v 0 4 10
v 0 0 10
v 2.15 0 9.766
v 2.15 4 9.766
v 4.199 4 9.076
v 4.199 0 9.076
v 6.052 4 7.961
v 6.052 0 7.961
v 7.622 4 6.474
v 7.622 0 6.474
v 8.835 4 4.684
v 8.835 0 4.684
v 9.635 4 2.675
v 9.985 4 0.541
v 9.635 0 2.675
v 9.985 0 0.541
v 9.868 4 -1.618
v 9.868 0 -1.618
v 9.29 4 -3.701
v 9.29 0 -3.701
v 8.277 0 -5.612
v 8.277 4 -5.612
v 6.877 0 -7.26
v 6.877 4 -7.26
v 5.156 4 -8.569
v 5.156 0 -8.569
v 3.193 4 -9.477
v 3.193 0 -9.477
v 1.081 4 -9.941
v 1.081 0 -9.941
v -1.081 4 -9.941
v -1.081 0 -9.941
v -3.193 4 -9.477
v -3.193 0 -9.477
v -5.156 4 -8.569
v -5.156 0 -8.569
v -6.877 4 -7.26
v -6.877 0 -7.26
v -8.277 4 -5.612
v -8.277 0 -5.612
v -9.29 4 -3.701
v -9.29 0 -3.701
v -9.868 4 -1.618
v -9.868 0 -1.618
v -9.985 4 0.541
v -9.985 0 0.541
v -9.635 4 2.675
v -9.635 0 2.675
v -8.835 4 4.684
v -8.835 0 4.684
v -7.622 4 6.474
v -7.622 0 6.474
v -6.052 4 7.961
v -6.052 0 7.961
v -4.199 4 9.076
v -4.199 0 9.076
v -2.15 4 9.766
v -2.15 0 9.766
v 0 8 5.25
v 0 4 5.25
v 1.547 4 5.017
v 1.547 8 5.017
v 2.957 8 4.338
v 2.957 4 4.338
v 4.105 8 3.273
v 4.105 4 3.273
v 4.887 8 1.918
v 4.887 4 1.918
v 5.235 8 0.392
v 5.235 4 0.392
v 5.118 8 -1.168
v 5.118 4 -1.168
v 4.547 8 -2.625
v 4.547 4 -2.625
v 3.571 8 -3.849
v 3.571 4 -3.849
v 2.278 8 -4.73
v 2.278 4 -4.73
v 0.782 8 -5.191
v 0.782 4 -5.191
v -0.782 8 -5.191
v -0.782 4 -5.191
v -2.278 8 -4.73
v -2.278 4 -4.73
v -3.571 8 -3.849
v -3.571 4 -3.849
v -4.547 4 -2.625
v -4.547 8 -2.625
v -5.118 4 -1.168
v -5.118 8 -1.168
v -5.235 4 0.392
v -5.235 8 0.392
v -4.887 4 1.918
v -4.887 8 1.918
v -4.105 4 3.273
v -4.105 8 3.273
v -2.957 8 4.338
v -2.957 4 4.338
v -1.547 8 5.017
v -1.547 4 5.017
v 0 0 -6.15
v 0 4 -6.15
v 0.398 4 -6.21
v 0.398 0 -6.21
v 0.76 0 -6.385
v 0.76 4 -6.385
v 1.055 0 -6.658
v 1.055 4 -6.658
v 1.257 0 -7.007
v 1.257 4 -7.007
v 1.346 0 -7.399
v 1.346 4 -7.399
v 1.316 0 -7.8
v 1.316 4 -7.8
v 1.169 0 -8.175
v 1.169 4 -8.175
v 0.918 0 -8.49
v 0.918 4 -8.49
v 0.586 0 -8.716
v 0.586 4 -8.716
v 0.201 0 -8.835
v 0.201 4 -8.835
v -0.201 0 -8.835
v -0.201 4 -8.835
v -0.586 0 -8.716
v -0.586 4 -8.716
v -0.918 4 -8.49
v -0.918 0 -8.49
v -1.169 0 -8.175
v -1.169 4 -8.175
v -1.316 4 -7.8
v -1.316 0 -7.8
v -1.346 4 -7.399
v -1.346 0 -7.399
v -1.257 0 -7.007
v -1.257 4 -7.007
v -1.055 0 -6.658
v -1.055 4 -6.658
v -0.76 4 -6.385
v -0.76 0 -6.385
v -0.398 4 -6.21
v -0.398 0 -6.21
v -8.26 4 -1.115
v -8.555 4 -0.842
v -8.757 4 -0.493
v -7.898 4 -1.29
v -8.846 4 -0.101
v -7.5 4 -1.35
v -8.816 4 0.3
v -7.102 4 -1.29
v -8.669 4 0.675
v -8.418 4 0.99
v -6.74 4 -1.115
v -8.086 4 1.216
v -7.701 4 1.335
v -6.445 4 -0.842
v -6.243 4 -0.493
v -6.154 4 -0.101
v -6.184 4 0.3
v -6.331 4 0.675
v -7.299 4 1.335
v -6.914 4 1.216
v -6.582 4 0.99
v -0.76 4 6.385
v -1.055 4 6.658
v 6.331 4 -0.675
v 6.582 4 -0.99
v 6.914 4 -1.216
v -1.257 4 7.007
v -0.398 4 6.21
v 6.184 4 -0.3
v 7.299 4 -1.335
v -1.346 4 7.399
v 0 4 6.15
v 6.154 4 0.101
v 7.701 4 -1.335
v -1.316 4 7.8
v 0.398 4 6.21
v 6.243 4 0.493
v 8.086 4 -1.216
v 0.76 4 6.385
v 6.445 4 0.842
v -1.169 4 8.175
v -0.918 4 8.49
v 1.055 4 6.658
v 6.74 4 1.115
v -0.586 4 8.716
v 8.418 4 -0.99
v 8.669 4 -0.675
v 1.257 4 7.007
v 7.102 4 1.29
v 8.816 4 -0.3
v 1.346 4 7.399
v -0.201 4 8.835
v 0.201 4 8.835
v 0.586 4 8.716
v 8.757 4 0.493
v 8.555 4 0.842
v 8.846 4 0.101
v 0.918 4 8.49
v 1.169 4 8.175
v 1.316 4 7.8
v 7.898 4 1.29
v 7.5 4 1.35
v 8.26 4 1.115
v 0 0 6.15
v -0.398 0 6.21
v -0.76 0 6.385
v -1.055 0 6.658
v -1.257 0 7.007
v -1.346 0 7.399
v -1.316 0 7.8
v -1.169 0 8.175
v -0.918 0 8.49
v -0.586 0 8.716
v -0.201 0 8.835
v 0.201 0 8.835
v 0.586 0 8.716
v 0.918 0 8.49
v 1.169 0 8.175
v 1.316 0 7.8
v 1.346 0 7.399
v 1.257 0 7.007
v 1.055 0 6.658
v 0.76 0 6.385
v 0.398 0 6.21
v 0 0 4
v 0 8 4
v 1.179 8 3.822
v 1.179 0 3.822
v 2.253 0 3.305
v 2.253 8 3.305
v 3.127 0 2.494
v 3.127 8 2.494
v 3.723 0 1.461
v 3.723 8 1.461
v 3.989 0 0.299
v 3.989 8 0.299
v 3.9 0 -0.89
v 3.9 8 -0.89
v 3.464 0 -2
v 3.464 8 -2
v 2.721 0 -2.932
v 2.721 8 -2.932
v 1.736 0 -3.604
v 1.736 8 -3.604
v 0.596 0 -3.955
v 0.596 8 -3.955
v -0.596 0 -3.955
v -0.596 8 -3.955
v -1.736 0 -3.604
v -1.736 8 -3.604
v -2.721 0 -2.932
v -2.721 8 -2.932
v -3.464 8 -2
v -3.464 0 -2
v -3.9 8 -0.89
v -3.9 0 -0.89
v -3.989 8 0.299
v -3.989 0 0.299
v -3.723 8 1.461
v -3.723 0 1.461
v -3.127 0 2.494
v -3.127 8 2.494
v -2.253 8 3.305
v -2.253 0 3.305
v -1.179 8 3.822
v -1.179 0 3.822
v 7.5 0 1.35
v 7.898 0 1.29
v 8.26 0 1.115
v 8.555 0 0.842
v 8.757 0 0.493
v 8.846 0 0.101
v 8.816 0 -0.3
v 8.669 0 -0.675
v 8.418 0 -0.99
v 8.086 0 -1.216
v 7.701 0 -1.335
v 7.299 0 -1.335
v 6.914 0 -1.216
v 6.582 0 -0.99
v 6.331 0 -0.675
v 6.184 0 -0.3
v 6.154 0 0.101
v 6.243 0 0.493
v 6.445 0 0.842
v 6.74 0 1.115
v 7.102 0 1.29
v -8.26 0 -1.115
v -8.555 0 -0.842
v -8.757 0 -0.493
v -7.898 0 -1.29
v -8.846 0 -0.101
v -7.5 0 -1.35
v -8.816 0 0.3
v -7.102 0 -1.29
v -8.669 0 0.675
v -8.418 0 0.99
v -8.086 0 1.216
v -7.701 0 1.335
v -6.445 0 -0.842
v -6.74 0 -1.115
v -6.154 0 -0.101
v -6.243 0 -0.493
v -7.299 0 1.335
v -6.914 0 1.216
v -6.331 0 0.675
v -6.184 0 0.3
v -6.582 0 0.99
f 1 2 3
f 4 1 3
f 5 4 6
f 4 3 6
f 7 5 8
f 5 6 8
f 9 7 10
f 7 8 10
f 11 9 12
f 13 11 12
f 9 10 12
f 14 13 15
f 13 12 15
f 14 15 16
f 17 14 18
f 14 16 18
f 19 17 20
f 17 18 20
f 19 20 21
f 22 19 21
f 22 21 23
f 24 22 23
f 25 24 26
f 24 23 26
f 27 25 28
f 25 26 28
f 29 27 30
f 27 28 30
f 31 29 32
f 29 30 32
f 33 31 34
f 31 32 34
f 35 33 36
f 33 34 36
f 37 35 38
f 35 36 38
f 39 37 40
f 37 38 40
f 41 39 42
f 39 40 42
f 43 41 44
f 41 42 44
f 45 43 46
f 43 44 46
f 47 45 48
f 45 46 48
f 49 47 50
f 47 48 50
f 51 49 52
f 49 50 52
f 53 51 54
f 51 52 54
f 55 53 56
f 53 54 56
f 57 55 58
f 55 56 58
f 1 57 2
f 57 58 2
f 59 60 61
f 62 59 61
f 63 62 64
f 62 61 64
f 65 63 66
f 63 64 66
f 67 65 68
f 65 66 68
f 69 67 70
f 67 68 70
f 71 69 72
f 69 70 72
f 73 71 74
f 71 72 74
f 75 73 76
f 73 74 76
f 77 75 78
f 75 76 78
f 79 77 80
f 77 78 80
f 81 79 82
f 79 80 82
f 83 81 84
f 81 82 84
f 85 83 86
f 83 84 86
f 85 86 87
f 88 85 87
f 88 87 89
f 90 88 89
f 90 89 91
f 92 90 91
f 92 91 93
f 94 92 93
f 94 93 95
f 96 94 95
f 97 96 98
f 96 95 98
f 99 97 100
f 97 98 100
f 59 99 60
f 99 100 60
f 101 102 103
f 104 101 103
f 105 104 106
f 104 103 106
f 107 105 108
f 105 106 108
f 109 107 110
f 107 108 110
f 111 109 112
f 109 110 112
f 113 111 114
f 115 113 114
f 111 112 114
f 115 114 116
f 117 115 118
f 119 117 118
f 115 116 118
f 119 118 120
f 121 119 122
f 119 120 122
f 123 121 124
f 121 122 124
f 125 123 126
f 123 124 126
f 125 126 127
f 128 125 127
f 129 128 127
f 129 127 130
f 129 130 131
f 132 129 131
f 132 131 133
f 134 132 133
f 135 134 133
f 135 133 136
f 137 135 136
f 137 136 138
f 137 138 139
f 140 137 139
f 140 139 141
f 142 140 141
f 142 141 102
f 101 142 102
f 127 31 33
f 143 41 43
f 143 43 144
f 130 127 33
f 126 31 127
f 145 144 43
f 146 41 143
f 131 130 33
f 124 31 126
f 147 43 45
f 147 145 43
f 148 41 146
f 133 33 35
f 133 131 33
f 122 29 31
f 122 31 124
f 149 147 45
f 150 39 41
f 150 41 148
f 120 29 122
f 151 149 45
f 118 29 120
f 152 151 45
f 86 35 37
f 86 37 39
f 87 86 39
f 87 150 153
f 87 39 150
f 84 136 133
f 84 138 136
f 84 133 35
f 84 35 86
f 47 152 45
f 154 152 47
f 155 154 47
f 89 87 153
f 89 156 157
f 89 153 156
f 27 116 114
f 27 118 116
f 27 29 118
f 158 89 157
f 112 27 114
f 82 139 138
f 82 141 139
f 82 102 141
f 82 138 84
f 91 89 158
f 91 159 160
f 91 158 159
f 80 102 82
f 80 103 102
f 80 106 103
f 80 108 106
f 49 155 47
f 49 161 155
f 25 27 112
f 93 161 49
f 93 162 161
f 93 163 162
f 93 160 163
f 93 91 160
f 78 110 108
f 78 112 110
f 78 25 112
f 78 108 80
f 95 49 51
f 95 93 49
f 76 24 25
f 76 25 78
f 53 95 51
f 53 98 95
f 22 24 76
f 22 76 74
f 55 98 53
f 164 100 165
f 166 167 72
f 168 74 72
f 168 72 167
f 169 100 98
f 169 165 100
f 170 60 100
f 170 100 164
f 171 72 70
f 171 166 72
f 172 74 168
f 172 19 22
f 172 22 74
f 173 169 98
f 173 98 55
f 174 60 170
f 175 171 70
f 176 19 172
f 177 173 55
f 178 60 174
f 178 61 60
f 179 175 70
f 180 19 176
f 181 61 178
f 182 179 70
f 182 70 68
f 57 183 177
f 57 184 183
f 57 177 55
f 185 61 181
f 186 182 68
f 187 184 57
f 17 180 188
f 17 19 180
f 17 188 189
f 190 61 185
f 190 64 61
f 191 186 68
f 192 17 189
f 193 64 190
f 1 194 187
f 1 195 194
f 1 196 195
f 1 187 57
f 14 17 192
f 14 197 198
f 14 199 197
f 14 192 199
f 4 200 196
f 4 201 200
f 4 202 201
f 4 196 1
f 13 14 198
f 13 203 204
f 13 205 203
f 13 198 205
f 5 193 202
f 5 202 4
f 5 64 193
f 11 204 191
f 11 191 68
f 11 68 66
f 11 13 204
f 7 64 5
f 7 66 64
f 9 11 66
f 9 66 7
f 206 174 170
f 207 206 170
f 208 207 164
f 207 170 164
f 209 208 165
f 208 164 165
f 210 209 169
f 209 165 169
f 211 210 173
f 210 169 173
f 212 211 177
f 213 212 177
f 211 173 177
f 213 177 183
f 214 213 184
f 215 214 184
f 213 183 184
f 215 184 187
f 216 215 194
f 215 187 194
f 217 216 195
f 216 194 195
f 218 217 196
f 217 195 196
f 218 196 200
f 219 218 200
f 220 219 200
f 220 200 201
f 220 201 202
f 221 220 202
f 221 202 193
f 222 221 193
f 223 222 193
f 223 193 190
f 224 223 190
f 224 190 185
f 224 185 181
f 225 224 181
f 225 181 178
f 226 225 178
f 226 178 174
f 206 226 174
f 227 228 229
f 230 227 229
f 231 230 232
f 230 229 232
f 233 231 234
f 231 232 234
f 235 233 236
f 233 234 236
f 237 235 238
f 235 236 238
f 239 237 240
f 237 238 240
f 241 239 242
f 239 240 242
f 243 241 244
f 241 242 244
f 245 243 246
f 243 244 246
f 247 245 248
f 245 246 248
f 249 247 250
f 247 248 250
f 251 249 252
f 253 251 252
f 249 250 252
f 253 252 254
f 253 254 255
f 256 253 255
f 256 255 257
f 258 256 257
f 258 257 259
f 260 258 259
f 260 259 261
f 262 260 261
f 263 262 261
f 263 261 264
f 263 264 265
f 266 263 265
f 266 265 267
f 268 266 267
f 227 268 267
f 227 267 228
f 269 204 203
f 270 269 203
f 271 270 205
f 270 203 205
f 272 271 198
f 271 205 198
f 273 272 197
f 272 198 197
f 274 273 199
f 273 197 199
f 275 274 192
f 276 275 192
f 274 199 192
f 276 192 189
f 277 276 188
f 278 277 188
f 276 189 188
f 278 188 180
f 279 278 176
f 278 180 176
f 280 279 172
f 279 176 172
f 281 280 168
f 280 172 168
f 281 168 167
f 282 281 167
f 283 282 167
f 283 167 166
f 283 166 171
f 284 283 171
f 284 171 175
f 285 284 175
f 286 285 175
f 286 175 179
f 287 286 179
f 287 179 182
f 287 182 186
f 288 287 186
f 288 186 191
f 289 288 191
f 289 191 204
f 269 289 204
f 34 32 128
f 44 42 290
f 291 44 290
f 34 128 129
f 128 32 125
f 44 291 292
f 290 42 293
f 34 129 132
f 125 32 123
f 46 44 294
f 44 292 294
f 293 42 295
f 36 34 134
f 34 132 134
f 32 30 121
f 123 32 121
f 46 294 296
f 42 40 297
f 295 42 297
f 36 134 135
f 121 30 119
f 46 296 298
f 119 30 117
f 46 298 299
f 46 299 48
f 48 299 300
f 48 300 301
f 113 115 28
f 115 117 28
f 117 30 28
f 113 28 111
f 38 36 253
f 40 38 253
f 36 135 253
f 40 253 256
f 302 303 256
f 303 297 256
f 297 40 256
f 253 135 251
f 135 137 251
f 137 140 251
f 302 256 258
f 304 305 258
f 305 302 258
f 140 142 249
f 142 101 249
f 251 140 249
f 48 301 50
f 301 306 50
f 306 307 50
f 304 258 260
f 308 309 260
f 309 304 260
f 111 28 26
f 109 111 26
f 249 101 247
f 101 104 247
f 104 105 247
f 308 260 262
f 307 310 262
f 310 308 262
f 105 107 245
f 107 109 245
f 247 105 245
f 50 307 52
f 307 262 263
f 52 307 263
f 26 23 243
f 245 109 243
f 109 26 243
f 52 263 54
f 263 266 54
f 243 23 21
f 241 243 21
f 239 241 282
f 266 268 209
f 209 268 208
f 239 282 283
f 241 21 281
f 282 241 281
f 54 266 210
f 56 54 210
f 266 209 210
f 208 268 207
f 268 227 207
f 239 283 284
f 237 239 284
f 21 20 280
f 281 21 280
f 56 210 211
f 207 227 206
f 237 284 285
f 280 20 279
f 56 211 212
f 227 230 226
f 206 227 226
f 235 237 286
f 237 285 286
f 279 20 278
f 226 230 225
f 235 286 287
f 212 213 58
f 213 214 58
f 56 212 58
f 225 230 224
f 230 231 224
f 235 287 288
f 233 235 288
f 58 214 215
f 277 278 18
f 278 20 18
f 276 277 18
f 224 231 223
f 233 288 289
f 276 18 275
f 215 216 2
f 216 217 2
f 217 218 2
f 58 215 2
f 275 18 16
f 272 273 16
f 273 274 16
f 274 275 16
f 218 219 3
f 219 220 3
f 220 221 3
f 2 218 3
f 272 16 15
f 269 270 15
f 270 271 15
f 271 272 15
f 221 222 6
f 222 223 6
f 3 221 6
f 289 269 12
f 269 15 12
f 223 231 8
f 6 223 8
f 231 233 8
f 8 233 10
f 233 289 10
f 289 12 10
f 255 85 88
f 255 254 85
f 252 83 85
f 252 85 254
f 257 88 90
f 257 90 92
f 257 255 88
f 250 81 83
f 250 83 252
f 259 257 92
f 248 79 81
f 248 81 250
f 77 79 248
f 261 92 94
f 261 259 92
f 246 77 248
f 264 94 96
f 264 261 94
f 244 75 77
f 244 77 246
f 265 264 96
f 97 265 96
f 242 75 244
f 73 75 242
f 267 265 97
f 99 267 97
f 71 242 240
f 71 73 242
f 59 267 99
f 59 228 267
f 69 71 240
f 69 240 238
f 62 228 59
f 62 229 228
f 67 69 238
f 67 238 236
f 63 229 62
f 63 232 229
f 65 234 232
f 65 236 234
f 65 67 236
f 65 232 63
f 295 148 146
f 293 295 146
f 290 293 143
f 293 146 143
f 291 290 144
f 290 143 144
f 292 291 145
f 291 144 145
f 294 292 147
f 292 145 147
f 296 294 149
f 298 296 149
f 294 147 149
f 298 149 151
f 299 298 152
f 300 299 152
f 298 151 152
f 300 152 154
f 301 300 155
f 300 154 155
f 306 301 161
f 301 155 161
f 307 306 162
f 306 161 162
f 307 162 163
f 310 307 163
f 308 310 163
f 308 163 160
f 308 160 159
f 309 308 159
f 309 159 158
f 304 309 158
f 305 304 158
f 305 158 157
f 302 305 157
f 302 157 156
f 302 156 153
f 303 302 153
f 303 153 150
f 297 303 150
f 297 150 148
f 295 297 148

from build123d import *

# Parameters (mm, degrees)
SKETCH1_R           = 10
BOSS_EXTRUDE1_DEPTH = 4
SKETCH2_R           = 5.25
BOSS_EXTRUDE2_DEPTH = 4
SKETCH3_R           = 1.35
CUT_EXTRUDE1_DEPTH  = 15.696938457
SKETCH4_R           = 4
CUT_EXTRUDE2_DEPTH  = 17.248076809


with BuildPart() as part:
    # Sketch1 → Boss-Extrude1 (new body)
    with BuildSketch(Plane(origin=(0, 0, 0), x_dir=(1, 0, 0), z_dir=(0, 1, 0))):
        with Locations(Location((0, 0, 0), (0, 0, 270))):
            Circle(SKETCH1_R)
    extrude(amount=BOSS_EXTRUDE1_DEPTH)

    # Sketch2 → Boss-Extrude2 (add)
    with BuildSketch(Plane(origin=(0, 4, 0), x_dir=(1, 0, 0), z_dir=(0, 1, 0))):
        with Locations(Location((0, 0, 0), (0, 0, 270))):
            Circle(SKETCH2_R)
    extrude(amount=BOSS_EXTRUDE2_DEPTH)

    # Sketch3 → Cut-Extrude1 (cut, through all)
    with BuildSketch(Plane(origin=(0, 4, 0), x_dir=(1, 0, 0), z_dir=(0, 1, 0))):
        with Locations(Location((0, 7.5, 0), (0, 0, 270))):
            Circle(SKETCH3_R)
        with Locations(Location((7.5, 0, 0), (0, 0, 270))):
            Circle(SKETCH3_R)
        with Locations(Location((0, -7.5, 0), (0, 0, 90))):
            Circle(SKETCH3_R)
        with Locations(Location((-7.5, 0, 0), (0, 0, 90))):
            Circle(SKETCH3_R)
    extrude(amount=-CUT_EXTRUDE1_DEPTH, mode=Mode.SUBTRACT)

    # Sketch4 → Cut-Extrude2 (cut, through all)
    with BuildSketch(Plane(origin=(0, 8, 0), x_dir=(-1, 0, 0), z_dir=(0, 1, 0))):
        with Locations(Location((0, 0, 0), (0, 0, 90))):
            Circle(SKETCH4_R)
    extrude(amount=-CUT_EXTRUDE2_DEPTH, mode=Mode.SUBTRACT)


solid = part.part
